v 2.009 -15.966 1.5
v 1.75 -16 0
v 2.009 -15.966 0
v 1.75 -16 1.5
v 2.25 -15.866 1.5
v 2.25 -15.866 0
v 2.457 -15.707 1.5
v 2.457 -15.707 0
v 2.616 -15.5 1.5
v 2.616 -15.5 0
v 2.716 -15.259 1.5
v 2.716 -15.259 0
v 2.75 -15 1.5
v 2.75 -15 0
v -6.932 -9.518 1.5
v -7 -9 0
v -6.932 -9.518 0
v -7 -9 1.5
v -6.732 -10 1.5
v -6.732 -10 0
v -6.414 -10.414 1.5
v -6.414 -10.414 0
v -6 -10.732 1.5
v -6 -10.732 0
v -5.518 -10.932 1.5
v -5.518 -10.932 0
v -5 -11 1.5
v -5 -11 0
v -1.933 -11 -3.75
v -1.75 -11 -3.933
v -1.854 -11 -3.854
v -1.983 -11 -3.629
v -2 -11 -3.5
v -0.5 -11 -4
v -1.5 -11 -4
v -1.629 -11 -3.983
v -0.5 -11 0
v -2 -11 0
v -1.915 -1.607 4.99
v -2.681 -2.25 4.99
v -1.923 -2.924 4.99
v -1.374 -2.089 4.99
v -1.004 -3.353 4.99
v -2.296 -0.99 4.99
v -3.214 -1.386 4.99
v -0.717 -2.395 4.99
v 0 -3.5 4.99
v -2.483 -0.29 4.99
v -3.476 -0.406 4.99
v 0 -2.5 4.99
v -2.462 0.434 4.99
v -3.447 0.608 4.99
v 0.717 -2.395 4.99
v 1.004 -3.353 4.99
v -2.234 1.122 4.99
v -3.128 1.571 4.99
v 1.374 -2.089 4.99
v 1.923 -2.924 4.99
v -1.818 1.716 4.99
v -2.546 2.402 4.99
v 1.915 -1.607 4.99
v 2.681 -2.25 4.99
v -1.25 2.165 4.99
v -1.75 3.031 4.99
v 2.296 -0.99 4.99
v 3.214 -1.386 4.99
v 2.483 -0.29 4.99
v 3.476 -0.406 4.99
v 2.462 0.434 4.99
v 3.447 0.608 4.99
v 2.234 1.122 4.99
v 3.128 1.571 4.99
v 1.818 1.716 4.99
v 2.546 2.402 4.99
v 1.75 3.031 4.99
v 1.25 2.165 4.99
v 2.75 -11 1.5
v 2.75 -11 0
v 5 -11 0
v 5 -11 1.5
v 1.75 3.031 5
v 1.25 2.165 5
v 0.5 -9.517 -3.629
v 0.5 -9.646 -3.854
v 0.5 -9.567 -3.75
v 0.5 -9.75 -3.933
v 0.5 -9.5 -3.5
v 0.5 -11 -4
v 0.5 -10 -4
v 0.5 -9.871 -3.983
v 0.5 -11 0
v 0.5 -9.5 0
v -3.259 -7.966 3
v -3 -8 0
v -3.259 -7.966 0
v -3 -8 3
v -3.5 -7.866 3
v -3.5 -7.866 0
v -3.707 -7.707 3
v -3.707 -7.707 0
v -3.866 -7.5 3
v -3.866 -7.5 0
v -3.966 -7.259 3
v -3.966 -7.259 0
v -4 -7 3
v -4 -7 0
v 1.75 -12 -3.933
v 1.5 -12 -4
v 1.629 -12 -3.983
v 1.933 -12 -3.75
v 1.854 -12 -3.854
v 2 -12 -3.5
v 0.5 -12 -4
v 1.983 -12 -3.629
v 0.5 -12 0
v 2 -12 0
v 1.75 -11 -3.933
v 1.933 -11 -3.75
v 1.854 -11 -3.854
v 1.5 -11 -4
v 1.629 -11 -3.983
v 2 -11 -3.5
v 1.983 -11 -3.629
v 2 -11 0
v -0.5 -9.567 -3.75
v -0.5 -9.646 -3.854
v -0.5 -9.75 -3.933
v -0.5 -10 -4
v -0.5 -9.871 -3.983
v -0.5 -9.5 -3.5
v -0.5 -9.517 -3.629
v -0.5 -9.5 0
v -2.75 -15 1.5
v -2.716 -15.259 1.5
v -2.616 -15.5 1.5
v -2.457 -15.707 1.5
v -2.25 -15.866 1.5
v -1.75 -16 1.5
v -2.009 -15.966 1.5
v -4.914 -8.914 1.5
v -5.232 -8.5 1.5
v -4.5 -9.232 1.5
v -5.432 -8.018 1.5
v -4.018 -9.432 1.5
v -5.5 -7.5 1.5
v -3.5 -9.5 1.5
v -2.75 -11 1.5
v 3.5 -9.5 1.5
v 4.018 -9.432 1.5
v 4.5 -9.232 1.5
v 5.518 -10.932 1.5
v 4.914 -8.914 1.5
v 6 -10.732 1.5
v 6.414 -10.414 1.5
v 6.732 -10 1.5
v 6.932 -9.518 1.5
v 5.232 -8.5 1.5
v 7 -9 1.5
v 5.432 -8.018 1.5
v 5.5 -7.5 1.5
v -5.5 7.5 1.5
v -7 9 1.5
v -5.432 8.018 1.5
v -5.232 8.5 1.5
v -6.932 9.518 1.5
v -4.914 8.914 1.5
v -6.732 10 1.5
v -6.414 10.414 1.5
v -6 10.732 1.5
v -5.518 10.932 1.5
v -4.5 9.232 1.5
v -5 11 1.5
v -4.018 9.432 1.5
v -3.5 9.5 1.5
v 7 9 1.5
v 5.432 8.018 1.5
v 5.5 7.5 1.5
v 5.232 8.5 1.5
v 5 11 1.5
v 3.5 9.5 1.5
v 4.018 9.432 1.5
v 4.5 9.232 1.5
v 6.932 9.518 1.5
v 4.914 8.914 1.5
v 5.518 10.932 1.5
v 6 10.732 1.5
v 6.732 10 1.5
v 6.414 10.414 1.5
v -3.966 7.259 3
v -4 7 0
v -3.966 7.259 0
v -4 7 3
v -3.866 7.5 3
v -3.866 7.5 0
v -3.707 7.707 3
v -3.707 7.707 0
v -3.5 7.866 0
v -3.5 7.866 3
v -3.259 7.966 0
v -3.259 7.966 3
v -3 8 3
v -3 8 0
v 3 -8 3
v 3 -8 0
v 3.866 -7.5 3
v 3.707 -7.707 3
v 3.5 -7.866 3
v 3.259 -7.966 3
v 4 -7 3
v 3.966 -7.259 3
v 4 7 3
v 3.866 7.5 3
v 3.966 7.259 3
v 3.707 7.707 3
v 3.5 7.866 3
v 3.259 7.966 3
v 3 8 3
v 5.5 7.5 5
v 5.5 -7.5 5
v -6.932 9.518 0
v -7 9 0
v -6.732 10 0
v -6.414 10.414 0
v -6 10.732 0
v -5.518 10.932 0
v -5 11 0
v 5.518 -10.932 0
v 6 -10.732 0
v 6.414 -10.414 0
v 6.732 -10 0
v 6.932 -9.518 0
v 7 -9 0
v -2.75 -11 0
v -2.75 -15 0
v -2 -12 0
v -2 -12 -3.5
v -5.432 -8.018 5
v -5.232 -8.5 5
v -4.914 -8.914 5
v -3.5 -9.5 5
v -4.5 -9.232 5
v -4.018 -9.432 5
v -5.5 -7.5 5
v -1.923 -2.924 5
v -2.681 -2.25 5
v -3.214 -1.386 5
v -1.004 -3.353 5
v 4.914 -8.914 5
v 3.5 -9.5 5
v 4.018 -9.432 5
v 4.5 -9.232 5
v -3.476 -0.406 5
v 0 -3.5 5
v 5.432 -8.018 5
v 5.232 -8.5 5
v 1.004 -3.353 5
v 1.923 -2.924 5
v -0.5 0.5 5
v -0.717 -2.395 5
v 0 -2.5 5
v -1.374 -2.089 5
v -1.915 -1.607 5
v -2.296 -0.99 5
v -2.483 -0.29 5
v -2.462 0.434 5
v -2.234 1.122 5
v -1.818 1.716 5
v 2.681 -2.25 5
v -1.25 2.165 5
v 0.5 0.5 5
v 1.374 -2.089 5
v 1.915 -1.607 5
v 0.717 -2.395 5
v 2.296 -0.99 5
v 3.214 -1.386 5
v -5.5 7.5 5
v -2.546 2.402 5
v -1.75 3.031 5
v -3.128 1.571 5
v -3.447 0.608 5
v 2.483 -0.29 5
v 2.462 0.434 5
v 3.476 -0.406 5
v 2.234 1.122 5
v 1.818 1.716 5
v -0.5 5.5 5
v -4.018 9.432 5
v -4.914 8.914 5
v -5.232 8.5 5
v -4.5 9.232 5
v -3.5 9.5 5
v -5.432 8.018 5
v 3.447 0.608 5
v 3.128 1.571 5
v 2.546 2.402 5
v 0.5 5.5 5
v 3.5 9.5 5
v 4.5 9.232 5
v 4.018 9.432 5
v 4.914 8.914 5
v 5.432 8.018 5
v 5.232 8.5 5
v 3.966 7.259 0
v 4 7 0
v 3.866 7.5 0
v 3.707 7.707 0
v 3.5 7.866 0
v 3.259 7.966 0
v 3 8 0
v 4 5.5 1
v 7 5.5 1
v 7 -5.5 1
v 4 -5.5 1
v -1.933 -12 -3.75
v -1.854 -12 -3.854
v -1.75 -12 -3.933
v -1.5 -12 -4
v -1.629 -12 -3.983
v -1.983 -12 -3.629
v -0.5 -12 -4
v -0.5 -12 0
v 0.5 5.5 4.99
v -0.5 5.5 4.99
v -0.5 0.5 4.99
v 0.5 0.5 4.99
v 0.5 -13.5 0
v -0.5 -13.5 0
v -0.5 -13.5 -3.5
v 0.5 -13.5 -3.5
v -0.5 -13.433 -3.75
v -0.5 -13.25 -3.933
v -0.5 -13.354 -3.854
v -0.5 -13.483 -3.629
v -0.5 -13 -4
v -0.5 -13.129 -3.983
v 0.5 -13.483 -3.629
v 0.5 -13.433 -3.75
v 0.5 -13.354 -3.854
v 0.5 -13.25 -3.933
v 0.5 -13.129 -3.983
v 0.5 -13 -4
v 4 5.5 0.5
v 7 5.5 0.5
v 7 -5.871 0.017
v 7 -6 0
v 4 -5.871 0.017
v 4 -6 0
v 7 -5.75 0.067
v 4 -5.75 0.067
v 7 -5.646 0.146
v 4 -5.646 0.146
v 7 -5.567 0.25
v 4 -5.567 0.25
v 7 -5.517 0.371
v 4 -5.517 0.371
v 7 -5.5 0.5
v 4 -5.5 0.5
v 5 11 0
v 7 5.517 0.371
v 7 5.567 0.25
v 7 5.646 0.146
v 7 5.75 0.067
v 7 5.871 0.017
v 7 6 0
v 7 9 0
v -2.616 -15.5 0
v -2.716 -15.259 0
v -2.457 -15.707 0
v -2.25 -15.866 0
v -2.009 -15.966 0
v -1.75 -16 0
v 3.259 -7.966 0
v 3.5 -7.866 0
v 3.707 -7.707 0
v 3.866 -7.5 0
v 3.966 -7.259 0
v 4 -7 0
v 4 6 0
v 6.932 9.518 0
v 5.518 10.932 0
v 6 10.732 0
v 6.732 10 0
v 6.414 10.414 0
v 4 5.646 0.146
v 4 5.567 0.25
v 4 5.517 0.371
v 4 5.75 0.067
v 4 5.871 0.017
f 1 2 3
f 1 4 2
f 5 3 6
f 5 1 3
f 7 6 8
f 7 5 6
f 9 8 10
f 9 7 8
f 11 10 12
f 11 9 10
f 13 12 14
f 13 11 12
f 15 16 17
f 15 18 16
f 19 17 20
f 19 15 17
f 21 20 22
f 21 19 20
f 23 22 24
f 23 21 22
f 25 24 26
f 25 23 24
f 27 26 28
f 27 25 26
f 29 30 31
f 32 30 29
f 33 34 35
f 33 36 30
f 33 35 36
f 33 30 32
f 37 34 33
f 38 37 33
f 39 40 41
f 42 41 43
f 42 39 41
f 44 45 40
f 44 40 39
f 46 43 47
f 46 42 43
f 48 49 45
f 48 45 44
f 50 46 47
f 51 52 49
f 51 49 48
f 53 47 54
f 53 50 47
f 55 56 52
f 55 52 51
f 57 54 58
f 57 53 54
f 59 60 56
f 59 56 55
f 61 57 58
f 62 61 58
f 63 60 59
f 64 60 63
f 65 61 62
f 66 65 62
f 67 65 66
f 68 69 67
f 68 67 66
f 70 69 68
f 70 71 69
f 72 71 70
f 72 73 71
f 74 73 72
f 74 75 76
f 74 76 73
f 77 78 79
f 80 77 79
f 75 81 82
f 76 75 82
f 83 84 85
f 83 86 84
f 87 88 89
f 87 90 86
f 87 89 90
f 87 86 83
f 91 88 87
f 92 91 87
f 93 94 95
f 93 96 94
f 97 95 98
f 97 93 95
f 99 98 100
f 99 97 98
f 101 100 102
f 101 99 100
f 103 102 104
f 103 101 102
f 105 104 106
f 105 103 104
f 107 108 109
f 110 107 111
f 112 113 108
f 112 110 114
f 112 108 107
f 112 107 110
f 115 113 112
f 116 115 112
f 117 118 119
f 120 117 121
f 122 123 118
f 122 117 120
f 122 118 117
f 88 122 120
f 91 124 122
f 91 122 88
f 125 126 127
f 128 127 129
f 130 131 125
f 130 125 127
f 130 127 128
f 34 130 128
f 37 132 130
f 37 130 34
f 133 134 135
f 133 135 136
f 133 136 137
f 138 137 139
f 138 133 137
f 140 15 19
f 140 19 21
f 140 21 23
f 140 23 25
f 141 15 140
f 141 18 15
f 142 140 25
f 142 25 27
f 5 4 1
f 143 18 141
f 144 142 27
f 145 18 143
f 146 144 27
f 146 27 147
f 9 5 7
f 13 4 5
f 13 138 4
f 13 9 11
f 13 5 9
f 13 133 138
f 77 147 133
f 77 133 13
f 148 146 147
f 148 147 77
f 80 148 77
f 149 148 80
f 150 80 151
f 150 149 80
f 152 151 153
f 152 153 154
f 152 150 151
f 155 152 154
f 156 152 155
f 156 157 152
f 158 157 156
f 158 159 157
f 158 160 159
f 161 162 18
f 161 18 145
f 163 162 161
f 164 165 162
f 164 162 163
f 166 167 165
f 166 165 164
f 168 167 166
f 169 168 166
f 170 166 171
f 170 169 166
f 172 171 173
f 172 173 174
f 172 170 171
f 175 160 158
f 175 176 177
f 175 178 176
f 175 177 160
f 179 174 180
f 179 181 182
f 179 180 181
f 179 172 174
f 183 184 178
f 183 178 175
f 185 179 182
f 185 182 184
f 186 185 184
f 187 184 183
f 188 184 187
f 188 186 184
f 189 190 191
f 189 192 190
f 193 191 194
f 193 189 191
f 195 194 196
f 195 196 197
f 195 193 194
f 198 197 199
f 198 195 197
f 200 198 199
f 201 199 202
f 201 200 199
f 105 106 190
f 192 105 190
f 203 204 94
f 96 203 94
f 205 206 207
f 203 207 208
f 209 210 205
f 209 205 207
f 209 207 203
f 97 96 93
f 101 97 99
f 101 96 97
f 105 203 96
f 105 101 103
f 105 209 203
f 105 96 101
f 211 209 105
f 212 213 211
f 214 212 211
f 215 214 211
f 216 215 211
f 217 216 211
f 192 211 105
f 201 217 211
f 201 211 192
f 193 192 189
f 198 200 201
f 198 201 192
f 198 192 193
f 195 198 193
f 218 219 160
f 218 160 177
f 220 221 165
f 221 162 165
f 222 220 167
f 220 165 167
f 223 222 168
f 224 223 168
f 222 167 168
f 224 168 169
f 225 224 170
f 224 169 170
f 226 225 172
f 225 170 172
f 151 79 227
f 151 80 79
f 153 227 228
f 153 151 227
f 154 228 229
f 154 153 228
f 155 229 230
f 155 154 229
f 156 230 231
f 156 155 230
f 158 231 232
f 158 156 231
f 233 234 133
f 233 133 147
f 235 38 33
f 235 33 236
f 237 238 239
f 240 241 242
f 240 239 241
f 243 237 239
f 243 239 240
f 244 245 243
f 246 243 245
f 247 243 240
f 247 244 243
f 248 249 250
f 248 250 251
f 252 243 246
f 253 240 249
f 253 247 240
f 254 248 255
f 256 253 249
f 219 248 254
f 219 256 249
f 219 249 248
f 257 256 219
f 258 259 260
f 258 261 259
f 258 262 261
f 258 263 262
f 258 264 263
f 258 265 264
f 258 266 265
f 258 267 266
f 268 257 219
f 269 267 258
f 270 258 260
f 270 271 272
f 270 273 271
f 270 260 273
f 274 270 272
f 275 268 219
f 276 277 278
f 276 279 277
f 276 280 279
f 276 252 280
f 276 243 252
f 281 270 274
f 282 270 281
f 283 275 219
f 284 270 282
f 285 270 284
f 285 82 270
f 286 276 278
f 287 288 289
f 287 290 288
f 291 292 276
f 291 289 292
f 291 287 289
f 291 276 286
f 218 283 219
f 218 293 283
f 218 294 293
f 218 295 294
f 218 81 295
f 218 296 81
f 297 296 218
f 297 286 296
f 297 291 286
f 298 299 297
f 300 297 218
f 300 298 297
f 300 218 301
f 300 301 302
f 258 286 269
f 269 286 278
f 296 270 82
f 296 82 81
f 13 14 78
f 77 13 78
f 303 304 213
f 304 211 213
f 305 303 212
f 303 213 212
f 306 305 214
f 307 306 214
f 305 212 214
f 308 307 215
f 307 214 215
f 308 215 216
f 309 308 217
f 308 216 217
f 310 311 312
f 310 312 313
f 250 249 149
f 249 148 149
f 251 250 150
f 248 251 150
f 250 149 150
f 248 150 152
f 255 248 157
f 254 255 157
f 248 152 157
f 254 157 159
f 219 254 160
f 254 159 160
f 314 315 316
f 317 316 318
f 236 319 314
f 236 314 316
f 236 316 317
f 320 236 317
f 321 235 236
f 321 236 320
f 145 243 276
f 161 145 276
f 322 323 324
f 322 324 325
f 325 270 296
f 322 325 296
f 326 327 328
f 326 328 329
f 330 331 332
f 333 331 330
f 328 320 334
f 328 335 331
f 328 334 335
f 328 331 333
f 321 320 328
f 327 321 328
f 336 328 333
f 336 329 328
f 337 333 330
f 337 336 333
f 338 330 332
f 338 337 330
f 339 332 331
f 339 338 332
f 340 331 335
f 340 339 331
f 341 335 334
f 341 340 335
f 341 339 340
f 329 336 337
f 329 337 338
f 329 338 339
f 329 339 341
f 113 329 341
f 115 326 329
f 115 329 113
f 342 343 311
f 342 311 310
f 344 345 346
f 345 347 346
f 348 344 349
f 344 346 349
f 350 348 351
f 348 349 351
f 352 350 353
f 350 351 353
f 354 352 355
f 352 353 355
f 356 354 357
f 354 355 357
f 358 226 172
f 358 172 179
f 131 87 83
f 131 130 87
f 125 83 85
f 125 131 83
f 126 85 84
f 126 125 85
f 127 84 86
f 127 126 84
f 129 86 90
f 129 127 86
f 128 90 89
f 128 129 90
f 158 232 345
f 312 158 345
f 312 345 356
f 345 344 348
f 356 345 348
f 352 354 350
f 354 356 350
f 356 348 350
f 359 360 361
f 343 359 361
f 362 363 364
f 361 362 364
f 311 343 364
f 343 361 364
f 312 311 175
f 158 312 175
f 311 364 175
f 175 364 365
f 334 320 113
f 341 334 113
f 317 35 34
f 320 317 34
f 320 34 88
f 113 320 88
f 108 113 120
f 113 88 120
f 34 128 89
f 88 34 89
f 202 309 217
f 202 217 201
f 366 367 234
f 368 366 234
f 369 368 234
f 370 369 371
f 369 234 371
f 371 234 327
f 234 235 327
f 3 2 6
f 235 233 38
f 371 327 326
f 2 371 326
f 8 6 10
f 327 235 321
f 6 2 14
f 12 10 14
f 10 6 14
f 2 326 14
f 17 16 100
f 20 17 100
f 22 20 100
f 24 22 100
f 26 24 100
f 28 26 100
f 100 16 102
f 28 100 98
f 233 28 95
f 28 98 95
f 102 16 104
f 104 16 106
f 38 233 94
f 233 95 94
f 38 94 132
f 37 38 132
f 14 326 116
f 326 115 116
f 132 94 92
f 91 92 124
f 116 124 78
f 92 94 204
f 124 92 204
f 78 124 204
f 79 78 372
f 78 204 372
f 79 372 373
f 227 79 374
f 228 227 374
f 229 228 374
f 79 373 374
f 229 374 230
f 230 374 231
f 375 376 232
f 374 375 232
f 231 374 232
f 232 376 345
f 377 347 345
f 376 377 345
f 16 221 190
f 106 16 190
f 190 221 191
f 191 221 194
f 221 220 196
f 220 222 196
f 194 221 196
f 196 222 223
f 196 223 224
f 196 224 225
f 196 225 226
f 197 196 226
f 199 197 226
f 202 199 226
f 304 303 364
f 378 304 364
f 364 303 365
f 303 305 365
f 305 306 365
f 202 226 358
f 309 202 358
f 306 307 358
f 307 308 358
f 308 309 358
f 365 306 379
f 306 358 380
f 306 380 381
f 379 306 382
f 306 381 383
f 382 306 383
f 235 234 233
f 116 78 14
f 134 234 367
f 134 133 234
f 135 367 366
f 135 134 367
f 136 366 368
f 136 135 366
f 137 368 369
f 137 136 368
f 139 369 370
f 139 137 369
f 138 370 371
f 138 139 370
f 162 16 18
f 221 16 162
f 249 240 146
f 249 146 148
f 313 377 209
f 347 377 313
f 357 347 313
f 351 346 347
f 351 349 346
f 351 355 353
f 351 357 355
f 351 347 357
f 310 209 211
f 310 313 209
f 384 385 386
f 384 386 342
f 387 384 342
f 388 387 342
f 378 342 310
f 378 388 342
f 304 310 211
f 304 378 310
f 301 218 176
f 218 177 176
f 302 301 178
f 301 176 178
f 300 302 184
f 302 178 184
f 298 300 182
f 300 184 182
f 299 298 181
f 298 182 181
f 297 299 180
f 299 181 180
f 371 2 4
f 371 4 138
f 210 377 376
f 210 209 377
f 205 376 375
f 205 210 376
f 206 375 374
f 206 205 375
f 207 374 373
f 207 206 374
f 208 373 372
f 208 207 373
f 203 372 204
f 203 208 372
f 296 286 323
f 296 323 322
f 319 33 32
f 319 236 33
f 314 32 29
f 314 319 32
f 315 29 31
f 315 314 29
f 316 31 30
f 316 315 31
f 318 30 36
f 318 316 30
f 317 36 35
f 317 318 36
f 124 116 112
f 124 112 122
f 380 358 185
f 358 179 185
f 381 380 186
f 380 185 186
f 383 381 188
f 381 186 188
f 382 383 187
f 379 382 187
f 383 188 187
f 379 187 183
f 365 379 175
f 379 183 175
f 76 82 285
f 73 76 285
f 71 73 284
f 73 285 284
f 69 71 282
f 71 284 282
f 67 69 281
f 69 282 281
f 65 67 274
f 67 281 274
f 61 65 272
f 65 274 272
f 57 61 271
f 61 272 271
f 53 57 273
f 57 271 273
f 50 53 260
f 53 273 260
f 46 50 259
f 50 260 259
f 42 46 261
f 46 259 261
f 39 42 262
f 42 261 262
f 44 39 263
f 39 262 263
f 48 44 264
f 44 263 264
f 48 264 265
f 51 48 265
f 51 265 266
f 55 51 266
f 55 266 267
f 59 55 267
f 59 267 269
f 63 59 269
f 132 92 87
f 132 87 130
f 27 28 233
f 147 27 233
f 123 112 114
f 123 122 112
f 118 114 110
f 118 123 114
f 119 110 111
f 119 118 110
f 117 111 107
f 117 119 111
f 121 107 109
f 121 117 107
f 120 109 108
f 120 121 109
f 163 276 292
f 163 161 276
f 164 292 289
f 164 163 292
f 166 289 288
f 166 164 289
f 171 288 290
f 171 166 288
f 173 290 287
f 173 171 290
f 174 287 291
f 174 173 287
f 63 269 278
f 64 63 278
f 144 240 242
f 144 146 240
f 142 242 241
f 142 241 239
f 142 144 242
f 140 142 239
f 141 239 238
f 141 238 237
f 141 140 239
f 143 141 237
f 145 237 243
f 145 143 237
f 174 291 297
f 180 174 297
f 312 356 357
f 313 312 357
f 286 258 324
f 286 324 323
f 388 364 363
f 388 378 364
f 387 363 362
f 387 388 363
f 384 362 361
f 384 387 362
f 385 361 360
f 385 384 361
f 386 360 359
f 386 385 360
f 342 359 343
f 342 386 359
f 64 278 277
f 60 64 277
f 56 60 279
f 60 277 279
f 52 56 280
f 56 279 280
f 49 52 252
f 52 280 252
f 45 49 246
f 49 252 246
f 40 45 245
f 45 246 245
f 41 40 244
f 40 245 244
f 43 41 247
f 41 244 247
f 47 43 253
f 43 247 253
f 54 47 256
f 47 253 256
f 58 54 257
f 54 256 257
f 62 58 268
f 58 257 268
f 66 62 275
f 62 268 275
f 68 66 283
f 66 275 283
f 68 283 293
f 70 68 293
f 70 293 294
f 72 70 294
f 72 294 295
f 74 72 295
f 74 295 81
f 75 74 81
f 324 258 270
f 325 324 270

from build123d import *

# Parameters (mm, degrees)
SKETCH_1_W           = 14
SKETCH_1_H           = 22
EXTRUDE_1_DEPTH      = 5
SKETCH_2_OUTSIDE_W   = 21.31
SKETCH_2_OUTSIDE_H   = 29.31
SKETCH_2_OUTSIDE_W_2 = 11
SKETCH_2_OUTSIDE_H_2 = 19
CUT_EXTRUDE_1_DEPTH  = 3.5
SKETCH_3_W           = 8
SKETCH_3_H           = 16
CUT_EXTRUDE_2_DEPTH  = 3
SKETCH_4_W           = 5.5
SKETCH_4_H           = 5
EXTRUDE_2_DEPTH      = 1.5
FILLET_1_R           = 2
FILLET_2_R           = 1
EXTRUDE_3_DEPTH      = 4
SKETCH_6_W           = 1
SKETCH_6_H           = 5
CUT_EXTRUDE_3_DEPTH  = 0.01
SKETCH_7_W           = 3
SKETCH_7_H           = 11
CUT_EXTRUDE_4_DEPTH  = 1
FILLET_3_R           = 0.5


with BuildPart() as part:
    # 草图1 → 凸台-拉伸1 (new body)
    with BuildSketch(Plane.XY):
        Rectangle(SKETCH_1_W, SKETCH_1_H)
    extrude(amount=EXTRUDE_1_DEPTH)

    # 草图2 outside → 切除-拉伸1 (cut)
    with BuildSketch(Plane.XY.offset(5)):
        Rectangle(SKETCH_2_OUTSIDE_W, SKETCH_2_OUTSIDE_H)
        Rectangle(SKETCH_2_OUTSIDE_W_2, SKETCH_2_OUTSIDE_H_2, mode=Mode.SUBTRACT)
    extrude(amount=-CUT_EXTRUDE_1_DEPTH, mode=Mode.SUBTRACT)

    # 草图3 → 切除-拉伸2 (cut)
    with BuildSketch(Plane(origin=(0, 0, 0), x_dir=(-1, 0, 0), z_dir=(0, 0, -1))):
        Rectangle(SKETCH_3_W, SKETCH_3_H)
    extrude(amount=-CUT_EXTRUDE_2_DEPTH, mode=Mode.SUBTRACT)

    # 草图4 → 凸台-拉伸2 (add)
    with BuildSketch(Plane(origin=(0, 0, 0), x_dir=(-1, 0, 0), z_dir=(0, 0, -1))):
        with Locations((0, -13.5)):
            Rectangle(SKETCH_4_W, SKETCH_4_H)
    extrude(amount=-EXTRUDE_2_DEPTH)

    # 圆角1
    fillet_1_edges = [part.edges().sort_by_distance(p)[0] for p in [
        (-7, 11, 0.75),
        (7, 11, 0.75),
        (7, -11, 0.75),
        (-7, -11, 0.75),
        (5.5, -9.5, 3.25),
        (-5.5, -9.5, 3.25),
        (-5.5, 9.5, 3.25),
        (5.5, 9.5, 3.25),
    ]]
    fillet(fillet_1_edges, radius=FILLET_1_R)

    # 圆角2
    fillet_2_edges = [part.edges().sort_by_distance(p)[0] for p in [
        (4, -8, 1.5),
        (4, 8, 1.5),
        (-4, 8, 1.5),
        (-4, -8, 1.5),
        (-2.75, -16, 0.75),
        (2.75, -16, 0.75),
    ]]
    fillet(fillet_2_edges, radius=FILLET_2_R)

    # 草图5 → 凸台-拉伸3 (add)
    with BuildSketch(Plane(origin=(0, 0, 0), x_dir=(-1, 0, 0), z_dir=(0, 0, -1))):
        Polygon((-2, -11), (-0.5, -11), (-0.5, -9.5), (0.5, -9.5), (0.5, -11), (2, -11), (2, -12), (0.5, -12), (0.5, -13.5), (-0.5, -13.5), (-0.5, -12), (-2, -12), align=None)
    extrude(amount=EXTRUDE_3_DEPTH)

    # 草图6 → 切除-拉伸3 (cut)
    with BuildSketch(Plane.XY.offset(5)):
        with BuildLine():
            Line((-1.25, 2.165063509), (-1.75, 3.031088913))
            ThreePointArc((-1.75, 3.031088913), (0, -3.5), (1.75, 3.031088913))
            Line((1.75, 3.031088913), (1.25, 2.165063509))
            ThreePointArc((1.25, 2.165063509), (0, -2.5), (-1.25, 2.165063509))
        make_face()
        with Locations((0, 3)):
            Rectangle(SKETCH_6_W, SKETCH_6_H)
    extrude(amount=-CUT_EXTRUDE_3_DEPTH, mode=Mode.SUBTRACT)

    # 草图7 → 切除-拉伸4 (cut)
    with BuildSketch(Plane(origin=(0, 0, 0), x_dir=(-1, 0, 0), z_dir=(0, 0, -1))):
        with Locations((-5.5, 0)):
            Rectangle(SKETCH_7_W, SKETCH_7_H)
    extrude(amount=-CUT_EXTRUDE_4_DEPTH, mode=Mode.SUBTRACT)

    # 圆角3
    fillet_3_edges = [part.edges().sort_by_distance(p)[0] for p in [
        (2, -11.5, -4),
        (0, -13.5, -4),
        (-2, -11.5, -4),
        (0, -9.5, -4),
        (5.5, -5.5, 0),
        (5.5, 5.5, 0),
    ]]
    fillet(fillet_3_edges, radius=FILLET_3_R)


solid = part.part
